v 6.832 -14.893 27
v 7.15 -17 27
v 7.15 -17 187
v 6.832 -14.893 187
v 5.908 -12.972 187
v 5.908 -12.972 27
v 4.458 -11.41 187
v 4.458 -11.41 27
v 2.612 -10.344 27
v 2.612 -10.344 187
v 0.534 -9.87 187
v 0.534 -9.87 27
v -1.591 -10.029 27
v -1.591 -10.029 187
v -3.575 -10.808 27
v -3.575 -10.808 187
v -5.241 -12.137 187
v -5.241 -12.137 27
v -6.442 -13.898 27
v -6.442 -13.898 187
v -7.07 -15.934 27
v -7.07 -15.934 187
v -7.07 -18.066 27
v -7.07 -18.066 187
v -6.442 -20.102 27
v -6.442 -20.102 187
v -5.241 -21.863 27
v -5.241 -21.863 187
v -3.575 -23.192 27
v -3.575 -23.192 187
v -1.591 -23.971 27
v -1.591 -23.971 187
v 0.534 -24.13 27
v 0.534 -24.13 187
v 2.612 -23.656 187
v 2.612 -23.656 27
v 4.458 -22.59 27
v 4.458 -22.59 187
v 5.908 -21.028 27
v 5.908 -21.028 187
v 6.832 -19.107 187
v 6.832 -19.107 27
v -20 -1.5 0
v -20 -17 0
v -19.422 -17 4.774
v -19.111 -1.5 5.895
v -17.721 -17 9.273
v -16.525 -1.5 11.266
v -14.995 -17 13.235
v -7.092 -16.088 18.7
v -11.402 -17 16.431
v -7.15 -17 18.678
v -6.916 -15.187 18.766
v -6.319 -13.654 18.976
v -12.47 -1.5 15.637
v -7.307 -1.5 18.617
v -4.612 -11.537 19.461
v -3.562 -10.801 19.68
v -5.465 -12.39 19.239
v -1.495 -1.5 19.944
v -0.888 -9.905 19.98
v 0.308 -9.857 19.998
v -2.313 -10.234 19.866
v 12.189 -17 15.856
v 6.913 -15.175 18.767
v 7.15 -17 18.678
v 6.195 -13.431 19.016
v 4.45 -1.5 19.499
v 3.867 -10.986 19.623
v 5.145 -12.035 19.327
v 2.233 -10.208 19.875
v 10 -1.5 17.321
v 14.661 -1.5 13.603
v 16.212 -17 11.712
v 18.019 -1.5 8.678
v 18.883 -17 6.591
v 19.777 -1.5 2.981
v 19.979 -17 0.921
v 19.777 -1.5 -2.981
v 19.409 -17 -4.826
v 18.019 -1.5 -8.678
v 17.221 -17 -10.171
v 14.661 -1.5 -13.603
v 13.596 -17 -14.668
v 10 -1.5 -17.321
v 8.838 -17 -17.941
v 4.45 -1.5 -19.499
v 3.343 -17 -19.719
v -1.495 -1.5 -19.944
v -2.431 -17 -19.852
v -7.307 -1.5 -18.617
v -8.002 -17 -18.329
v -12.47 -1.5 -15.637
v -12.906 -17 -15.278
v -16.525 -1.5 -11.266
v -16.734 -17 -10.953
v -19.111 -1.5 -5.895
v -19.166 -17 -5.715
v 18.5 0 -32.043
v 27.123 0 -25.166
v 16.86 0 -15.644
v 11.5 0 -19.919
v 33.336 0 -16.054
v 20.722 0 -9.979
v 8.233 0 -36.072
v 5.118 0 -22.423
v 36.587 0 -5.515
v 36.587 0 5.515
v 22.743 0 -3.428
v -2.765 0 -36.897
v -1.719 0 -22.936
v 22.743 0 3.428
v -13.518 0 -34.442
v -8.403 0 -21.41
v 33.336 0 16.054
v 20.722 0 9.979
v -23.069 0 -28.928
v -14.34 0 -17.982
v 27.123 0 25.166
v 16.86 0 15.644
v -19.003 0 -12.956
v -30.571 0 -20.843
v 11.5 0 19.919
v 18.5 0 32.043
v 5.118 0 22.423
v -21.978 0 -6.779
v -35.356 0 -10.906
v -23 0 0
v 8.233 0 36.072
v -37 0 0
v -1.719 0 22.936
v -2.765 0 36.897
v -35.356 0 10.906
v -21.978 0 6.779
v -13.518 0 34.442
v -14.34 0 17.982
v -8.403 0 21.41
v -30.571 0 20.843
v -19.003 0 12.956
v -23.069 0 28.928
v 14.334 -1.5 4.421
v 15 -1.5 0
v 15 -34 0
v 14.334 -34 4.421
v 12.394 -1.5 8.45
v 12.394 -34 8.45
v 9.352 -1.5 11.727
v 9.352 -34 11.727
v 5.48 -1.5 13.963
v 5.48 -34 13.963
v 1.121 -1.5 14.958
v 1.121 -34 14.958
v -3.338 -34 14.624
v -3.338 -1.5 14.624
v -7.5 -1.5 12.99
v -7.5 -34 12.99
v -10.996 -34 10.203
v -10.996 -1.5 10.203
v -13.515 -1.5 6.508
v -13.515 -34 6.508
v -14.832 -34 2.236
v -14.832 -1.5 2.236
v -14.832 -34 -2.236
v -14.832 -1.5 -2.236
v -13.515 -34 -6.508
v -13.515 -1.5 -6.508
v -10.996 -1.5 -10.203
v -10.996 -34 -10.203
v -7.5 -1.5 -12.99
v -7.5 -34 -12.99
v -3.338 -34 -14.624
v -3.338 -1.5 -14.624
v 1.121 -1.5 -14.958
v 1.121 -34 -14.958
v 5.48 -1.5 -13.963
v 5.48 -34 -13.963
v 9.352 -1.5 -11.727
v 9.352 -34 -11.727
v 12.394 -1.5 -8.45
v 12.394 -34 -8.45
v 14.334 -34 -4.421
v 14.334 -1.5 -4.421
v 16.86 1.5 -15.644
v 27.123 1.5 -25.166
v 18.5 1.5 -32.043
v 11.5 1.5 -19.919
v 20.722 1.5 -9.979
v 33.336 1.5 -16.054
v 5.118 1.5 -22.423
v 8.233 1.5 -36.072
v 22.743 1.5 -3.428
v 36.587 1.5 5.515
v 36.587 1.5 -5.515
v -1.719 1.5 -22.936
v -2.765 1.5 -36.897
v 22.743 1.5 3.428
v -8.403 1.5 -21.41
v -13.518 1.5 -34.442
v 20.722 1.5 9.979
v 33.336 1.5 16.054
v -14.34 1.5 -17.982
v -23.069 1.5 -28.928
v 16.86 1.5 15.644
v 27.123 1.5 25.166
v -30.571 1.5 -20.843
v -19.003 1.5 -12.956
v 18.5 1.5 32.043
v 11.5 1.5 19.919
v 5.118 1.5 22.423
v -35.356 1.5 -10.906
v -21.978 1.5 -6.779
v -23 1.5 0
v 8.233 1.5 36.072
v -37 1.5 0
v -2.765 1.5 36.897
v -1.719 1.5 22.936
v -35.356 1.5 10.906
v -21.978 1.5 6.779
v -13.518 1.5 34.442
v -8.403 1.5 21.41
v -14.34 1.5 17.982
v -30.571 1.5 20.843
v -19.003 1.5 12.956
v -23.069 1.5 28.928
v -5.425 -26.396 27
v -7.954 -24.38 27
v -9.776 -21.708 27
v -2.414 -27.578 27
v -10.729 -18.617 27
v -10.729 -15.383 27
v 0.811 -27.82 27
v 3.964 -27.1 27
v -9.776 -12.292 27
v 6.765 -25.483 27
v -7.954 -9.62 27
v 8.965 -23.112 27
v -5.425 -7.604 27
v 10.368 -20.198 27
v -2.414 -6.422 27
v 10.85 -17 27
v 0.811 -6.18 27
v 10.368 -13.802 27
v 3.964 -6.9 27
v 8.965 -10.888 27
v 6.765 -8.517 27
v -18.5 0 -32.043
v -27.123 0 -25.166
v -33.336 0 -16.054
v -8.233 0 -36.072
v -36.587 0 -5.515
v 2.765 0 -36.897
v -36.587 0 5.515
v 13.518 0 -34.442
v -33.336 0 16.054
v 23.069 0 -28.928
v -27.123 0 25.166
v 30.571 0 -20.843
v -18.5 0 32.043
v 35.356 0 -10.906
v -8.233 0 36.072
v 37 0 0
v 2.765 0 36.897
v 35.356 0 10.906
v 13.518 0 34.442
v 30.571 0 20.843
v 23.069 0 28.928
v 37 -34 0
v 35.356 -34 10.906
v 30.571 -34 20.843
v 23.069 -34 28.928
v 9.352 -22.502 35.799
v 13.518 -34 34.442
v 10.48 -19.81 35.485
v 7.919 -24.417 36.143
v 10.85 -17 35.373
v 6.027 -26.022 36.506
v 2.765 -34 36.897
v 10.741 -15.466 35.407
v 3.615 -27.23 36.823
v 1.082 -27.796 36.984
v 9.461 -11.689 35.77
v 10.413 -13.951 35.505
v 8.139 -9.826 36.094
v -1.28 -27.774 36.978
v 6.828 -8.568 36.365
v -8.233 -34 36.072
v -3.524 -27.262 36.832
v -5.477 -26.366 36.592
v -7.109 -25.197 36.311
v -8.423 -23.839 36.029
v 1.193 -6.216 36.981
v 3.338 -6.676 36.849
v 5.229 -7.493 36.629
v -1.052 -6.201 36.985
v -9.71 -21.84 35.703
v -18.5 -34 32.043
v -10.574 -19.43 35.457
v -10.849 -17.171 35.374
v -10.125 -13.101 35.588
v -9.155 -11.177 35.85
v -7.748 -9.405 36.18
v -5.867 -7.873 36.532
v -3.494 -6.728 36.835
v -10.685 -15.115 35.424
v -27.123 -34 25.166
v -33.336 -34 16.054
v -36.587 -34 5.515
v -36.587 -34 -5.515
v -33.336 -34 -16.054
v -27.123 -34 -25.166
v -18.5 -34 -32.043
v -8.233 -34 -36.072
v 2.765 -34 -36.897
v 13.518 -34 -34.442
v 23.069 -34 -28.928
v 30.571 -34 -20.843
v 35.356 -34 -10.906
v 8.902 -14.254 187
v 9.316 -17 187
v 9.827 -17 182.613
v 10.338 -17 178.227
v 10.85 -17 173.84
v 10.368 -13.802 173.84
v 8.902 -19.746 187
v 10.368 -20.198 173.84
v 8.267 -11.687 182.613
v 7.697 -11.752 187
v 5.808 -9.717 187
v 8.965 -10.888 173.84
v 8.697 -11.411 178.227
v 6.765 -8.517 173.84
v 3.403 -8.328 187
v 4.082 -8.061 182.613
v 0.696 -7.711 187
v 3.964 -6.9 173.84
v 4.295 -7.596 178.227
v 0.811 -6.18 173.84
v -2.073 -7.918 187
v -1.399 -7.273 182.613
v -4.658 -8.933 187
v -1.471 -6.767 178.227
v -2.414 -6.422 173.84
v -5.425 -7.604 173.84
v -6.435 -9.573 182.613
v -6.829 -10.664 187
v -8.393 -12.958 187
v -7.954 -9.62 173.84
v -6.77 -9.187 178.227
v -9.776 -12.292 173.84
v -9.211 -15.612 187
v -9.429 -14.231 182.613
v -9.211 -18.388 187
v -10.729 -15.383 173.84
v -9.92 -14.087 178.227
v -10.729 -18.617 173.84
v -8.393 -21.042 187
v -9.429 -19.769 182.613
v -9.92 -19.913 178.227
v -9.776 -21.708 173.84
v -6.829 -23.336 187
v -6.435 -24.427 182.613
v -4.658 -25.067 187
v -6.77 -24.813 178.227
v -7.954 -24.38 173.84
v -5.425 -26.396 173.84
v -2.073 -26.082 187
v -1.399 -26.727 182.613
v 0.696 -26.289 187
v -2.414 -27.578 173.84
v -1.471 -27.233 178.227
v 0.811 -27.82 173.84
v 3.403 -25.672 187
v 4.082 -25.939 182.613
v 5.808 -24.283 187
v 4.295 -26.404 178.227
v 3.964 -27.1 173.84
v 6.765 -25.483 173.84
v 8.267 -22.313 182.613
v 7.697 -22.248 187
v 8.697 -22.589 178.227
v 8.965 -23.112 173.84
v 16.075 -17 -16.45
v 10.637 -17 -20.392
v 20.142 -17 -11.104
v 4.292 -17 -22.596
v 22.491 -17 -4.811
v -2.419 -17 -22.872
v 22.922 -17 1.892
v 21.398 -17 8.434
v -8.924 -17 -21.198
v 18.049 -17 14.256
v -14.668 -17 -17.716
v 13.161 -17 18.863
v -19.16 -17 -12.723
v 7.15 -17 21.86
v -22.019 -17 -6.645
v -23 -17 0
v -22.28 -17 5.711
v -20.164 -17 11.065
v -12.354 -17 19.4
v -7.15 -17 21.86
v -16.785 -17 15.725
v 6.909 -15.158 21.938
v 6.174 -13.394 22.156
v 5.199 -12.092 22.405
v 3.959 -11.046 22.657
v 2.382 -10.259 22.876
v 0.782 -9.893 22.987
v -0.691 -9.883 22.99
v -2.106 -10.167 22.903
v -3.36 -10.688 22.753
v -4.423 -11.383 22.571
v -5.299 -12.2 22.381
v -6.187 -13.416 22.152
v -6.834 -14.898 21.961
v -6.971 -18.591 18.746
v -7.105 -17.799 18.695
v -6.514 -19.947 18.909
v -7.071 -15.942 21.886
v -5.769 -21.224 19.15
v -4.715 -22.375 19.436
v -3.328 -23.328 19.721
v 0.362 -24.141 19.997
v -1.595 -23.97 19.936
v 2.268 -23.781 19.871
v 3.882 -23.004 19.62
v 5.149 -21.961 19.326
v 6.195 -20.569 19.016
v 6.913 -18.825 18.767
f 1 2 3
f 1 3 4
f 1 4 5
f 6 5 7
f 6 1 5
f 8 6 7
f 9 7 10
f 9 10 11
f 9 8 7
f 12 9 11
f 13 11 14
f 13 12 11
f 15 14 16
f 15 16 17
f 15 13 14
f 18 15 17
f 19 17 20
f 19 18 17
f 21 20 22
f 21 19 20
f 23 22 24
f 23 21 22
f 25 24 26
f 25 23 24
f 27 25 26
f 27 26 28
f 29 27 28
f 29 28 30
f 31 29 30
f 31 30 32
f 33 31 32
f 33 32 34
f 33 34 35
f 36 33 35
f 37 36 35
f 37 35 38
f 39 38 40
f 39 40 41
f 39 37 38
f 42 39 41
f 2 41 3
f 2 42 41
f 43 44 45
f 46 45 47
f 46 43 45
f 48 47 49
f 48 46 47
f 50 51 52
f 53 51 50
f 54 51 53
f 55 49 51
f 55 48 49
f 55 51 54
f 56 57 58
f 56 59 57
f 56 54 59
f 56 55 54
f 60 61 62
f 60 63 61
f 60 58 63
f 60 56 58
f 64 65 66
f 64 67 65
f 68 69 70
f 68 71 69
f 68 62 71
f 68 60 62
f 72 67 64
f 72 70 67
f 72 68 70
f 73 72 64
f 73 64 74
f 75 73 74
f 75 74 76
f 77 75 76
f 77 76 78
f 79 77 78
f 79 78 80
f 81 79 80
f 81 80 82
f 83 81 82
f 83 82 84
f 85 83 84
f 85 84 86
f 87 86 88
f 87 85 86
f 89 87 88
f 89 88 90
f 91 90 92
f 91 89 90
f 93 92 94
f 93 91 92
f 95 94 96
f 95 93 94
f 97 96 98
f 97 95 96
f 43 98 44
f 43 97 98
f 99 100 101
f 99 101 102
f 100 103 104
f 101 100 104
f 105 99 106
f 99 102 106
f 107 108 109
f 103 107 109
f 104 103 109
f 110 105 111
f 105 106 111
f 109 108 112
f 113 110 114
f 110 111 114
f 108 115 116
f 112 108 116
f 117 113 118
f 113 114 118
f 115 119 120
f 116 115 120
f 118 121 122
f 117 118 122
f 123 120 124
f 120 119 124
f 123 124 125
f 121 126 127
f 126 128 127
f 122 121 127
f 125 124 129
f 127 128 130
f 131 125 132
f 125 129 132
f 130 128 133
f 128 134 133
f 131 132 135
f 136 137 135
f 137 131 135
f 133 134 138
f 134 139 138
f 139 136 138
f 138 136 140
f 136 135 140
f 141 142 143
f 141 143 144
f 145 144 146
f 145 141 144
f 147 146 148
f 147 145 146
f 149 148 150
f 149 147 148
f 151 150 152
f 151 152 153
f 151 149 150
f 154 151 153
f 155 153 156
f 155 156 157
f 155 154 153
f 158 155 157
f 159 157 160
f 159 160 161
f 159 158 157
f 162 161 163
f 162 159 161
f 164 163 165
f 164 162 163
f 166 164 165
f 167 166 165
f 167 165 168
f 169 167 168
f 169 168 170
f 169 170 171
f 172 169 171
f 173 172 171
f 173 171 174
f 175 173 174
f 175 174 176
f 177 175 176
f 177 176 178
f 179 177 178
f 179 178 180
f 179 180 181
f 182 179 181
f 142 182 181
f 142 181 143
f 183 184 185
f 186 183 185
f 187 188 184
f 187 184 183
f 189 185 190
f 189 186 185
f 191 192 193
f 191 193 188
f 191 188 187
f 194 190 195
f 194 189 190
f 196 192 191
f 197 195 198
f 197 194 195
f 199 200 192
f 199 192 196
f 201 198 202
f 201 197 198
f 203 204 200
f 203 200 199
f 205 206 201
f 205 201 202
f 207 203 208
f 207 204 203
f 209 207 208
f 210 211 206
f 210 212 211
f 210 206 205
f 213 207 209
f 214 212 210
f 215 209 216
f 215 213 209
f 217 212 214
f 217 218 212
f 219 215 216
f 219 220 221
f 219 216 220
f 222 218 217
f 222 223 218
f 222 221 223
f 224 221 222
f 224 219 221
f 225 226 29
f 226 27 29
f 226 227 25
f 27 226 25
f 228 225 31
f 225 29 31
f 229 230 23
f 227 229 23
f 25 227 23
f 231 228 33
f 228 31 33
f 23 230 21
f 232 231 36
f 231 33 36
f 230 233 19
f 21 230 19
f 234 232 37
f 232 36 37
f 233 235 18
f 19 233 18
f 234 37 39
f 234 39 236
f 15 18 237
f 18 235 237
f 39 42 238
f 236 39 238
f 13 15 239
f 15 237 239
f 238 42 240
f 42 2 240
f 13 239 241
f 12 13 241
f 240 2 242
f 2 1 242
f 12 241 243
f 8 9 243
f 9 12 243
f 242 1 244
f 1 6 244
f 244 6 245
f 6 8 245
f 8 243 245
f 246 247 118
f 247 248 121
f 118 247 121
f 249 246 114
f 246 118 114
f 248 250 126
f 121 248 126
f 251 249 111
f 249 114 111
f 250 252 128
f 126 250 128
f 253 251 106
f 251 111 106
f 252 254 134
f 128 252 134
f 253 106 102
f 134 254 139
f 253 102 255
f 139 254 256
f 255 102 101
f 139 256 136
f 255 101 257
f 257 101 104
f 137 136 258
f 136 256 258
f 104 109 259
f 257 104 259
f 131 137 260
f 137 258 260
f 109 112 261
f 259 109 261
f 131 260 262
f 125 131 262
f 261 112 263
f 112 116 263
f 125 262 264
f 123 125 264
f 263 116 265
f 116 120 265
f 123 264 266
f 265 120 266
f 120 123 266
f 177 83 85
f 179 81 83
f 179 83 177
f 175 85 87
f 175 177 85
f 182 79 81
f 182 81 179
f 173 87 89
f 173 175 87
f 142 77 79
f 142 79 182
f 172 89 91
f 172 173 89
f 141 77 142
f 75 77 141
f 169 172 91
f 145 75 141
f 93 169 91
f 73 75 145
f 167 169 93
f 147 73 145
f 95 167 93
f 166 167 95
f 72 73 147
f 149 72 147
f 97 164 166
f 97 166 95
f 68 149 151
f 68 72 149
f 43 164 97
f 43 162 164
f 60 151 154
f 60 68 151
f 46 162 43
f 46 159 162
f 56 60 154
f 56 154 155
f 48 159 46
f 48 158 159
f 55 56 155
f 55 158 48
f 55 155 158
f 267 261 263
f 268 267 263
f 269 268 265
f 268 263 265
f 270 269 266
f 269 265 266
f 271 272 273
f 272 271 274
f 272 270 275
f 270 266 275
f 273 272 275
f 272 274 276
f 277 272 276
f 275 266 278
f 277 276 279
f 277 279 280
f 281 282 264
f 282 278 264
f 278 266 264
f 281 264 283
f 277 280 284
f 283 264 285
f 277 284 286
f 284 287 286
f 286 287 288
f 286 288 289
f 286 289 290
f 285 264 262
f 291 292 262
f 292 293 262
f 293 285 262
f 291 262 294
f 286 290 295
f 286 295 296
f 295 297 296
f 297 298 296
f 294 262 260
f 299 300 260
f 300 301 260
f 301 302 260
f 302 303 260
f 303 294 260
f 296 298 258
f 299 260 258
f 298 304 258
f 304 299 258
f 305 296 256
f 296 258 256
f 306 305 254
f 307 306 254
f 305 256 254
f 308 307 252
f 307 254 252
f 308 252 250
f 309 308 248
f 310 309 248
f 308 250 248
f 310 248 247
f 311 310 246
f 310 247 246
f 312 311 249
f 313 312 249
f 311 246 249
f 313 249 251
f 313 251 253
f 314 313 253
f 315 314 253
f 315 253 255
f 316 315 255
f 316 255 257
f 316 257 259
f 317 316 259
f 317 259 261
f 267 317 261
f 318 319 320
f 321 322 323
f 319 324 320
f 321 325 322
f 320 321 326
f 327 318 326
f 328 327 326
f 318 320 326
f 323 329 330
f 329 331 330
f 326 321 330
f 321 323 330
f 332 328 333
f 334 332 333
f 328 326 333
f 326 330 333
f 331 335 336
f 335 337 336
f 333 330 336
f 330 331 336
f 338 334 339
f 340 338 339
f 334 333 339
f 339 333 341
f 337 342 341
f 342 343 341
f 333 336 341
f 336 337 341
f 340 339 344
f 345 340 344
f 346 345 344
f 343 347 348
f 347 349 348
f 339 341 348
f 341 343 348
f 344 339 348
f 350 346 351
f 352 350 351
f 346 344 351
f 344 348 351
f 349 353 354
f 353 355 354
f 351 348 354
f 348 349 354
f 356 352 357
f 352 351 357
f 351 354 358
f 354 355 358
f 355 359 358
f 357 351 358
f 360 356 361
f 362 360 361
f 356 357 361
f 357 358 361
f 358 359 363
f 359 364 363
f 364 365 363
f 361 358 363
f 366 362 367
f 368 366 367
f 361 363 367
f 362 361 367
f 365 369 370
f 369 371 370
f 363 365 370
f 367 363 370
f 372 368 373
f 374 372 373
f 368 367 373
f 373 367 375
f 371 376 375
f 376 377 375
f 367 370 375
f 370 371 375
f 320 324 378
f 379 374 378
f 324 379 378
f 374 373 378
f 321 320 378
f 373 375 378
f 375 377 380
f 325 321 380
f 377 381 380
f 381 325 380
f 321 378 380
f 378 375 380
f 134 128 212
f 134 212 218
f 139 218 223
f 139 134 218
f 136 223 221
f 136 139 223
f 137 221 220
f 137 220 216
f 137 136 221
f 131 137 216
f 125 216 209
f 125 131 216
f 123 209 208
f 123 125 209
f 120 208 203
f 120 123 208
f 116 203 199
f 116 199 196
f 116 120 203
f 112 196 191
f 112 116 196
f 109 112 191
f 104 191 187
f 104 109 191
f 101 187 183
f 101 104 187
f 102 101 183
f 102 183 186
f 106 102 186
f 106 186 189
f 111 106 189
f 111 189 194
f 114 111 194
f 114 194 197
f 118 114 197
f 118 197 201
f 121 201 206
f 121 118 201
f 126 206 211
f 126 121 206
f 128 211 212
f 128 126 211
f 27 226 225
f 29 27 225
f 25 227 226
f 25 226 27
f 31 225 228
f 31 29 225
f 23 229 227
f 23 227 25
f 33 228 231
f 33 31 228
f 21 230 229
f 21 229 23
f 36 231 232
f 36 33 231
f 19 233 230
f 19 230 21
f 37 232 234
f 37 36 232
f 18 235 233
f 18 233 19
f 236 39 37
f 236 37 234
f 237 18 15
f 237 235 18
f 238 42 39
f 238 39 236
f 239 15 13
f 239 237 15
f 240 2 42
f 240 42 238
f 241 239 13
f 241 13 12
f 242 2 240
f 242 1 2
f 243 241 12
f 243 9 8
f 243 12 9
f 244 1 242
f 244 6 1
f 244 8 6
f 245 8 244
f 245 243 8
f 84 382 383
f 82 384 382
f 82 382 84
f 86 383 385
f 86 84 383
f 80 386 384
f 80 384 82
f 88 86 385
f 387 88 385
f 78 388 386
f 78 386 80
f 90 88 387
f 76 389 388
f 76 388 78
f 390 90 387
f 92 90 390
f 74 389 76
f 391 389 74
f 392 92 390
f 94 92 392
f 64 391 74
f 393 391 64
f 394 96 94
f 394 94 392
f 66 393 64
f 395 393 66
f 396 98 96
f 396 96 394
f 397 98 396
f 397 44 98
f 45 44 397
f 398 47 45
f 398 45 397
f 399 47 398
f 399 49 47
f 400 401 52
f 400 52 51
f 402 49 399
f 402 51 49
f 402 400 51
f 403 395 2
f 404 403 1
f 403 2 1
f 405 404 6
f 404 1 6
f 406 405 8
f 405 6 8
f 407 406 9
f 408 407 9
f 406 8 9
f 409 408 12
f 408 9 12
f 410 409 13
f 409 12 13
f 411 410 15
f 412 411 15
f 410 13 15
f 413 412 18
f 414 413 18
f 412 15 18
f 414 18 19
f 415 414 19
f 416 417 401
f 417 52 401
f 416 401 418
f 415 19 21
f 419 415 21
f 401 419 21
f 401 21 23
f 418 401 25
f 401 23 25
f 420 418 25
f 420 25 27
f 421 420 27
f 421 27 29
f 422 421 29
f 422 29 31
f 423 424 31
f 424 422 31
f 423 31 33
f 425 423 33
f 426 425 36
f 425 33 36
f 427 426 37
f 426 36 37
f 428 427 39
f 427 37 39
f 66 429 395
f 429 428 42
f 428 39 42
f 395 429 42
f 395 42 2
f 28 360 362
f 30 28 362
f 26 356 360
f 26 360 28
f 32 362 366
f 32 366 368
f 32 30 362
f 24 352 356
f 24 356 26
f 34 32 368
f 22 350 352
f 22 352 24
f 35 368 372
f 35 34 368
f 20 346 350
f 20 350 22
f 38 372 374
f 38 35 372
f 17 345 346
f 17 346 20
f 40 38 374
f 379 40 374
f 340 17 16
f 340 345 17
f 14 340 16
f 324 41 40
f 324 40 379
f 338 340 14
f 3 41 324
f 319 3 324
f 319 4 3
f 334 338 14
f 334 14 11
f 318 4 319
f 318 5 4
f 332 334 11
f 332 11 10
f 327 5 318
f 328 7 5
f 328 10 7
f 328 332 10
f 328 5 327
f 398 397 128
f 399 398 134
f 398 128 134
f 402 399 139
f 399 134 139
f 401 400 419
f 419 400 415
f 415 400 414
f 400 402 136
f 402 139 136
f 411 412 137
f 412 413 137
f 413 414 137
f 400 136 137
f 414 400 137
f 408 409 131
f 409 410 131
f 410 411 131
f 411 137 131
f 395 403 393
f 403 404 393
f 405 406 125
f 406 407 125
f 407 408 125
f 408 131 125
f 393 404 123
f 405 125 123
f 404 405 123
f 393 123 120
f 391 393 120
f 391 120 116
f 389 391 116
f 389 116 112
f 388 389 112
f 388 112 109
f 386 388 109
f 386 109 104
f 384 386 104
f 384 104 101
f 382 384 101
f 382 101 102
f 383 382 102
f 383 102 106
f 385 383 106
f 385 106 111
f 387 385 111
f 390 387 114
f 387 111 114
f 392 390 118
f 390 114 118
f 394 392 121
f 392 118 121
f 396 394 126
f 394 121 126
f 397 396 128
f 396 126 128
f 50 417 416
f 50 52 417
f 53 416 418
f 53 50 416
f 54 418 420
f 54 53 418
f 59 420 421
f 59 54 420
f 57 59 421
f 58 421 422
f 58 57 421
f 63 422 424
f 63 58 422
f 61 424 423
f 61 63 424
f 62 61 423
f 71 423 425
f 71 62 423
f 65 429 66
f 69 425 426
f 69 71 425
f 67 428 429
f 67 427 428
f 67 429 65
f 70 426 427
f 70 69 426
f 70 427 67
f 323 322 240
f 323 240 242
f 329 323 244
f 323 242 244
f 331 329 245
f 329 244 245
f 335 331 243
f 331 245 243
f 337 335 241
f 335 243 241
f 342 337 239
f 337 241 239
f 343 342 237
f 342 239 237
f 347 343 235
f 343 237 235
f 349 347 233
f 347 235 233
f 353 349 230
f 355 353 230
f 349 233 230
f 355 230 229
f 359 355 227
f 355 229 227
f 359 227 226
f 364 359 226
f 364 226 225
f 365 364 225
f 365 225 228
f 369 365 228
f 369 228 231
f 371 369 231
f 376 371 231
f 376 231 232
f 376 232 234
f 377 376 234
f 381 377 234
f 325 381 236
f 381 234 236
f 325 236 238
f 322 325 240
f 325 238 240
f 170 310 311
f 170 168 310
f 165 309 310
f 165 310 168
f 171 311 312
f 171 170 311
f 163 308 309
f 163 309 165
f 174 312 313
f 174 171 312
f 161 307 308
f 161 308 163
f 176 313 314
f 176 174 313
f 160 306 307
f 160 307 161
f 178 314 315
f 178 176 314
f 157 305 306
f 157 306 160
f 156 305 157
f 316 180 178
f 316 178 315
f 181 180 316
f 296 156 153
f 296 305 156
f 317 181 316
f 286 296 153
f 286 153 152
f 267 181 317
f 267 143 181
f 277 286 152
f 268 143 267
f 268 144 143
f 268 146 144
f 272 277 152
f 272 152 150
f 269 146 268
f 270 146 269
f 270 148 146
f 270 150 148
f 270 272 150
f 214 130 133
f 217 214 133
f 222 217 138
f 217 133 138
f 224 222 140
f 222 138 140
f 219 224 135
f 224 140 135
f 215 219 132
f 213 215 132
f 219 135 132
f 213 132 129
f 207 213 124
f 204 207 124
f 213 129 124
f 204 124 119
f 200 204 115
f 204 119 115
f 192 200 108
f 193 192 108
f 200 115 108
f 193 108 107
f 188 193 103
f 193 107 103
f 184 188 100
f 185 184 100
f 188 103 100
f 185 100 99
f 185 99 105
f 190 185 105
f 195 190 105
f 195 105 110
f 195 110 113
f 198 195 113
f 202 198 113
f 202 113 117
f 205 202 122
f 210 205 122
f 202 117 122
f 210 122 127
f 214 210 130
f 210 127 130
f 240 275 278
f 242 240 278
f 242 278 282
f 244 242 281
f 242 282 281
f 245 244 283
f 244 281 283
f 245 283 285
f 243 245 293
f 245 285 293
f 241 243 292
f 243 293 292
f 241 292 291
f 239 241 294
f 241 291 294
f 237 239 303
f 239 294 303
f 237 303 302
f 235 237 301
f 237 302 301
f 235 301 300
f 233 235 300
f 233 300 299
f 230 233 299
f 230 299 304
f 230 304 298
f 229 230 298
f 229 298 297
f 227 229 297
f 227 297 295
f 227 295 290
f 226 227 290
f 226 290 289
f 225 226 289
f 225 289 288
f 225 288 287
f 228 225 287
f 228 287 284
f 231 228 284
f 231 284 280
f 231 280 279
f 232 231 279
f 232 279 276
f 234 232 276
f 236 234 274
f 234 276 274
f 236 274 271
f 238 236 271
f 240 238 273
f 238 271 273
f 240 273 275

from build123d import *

# Parameters (mm, degrees)
F0_R          = 37
F0_R_2        = 15
F1_DEPTH      = 34
F2_R          = 23
F2_R_2        = 15
F3_DEPTH      = 1.5
F4_R          = 23
F4_R_2        = 20
F5_DEPTH      = 17
F8_END_RADIUS = 20
F7_R          = 7.15
F8_REACH      = 94.2242539419
F9_R          = 10.85
F10_DEPTH     = 10
F11_R         = 10.85
F11_R_2       = 7.15
F12_DEPTH     = 160
F13_SIZE2     = 13.16
F13_SIZE      = 1.5345
F14_R         = 37
F14_R_2       = 23
F15_DEPTH     = 1.5


with BuildPart() as f1:
    # F0 (on Front) → F1 (new body)
    with BuildSketch(Plane.XZ):
        Circle(F0_R)
        Circle(F0_R_2, mode=Mode.SUBTRACT)
    extrude(amount=F1_DEPTH)

    # F2 (on face) → F3 (cut)
    with BuildSketch(Plane(origin=(0, 0, 0), x_dir=(-1, 0, 0), z_dir=(0, 1, 0))):
        Circle(F2_R)
        Circle(F2_R_2, mode=Mode.SUBTRACT)
    extrude(amount=-F3_DEPTH, mode=Mode.SUBTRACT)

    # F4 (on face) → F5 (cut)
    with BuildSketch(Plane(origin=(0, 0, 0), x_dir=(-1, 0, 0), z_dir=(0, 1, 0))):
        Circle(F4_R)
        Circle(F4_R_2, mode=Mode.SUBTRACT)
    extrude(amount=-F5_DEPTH, mode=Mode.SUBTRACT)

    f8_end = (Plane.ZX.offset(-9.25) * Cylinder(F8_END_RADIUS, 408.5212231395, mode=Mode.PRIVATE)).faces().sort_by_distance((20, -9.25, 0))[0]
    # F7 (on offset) → F8 (cut, up to the whole of a round face its end follows)
    with BuildSketch(Plane.XY.offset(37)):
        with Locations((0, -17)):
            Circle(F7_R)
    f8_long = extrude(amount=-F8_REACH, mode=Mode.PRIVATE)
    add(split(f8_long, bisect_by=f8_end, keep=Keep.ALL, mode=Mode.PRIVATE).solids().sort_by_distance((0, -17, 37))[0], mode=Mode.SUBTRACT)

    # F9 (on offset) → F10 (cut)
    with BuildSketch(Plane.XY.offset(37)):
        with Locations((0, -17)):
            Circle(F9_R)
    extrude(amount=-F10_DEPTH, mode=Mode.SUBTRACT)


with BuildPart() as f12:
    # F11 (on face) → F12 (new body)
    with BuildSketch(Plane.XY.offset(27)):
        with Locations((0, -17)):
            Circle(F11_R)
        with Locations((0, -17)):
            Circle(F11_R_2, mode=Mode.SUBTRACT)
    extrude(amount=F12_DEPTH)

    # F13
    f13_edges = [f12.edges().sort_by_distance(p)[0] for p in [
        (-10.85, -17, 187),
    ]]
    f13_side = f12.faces().sort_by_distance((-10.543116, -17, 187))[0]
    chamfer(f13_edges, length=F13_SIZE, length2=F13_SIZE2, reference=f13_side)


with BuildPart() as f15:
    # F14 (on face) → F15 (new body)
    with BuildSketch(Plane(origin=(0, 0, 0), x_dir=(-1, 0, 0), z_dir=(0, 1, 0))):
        Circle(F14_R)
        Circle(F14_R_2, mode=Mode.SUBTRACT)
    extrude(amount=F15_DEPTH)


solid = Compound([f1.part, f12.part, f15.part])
